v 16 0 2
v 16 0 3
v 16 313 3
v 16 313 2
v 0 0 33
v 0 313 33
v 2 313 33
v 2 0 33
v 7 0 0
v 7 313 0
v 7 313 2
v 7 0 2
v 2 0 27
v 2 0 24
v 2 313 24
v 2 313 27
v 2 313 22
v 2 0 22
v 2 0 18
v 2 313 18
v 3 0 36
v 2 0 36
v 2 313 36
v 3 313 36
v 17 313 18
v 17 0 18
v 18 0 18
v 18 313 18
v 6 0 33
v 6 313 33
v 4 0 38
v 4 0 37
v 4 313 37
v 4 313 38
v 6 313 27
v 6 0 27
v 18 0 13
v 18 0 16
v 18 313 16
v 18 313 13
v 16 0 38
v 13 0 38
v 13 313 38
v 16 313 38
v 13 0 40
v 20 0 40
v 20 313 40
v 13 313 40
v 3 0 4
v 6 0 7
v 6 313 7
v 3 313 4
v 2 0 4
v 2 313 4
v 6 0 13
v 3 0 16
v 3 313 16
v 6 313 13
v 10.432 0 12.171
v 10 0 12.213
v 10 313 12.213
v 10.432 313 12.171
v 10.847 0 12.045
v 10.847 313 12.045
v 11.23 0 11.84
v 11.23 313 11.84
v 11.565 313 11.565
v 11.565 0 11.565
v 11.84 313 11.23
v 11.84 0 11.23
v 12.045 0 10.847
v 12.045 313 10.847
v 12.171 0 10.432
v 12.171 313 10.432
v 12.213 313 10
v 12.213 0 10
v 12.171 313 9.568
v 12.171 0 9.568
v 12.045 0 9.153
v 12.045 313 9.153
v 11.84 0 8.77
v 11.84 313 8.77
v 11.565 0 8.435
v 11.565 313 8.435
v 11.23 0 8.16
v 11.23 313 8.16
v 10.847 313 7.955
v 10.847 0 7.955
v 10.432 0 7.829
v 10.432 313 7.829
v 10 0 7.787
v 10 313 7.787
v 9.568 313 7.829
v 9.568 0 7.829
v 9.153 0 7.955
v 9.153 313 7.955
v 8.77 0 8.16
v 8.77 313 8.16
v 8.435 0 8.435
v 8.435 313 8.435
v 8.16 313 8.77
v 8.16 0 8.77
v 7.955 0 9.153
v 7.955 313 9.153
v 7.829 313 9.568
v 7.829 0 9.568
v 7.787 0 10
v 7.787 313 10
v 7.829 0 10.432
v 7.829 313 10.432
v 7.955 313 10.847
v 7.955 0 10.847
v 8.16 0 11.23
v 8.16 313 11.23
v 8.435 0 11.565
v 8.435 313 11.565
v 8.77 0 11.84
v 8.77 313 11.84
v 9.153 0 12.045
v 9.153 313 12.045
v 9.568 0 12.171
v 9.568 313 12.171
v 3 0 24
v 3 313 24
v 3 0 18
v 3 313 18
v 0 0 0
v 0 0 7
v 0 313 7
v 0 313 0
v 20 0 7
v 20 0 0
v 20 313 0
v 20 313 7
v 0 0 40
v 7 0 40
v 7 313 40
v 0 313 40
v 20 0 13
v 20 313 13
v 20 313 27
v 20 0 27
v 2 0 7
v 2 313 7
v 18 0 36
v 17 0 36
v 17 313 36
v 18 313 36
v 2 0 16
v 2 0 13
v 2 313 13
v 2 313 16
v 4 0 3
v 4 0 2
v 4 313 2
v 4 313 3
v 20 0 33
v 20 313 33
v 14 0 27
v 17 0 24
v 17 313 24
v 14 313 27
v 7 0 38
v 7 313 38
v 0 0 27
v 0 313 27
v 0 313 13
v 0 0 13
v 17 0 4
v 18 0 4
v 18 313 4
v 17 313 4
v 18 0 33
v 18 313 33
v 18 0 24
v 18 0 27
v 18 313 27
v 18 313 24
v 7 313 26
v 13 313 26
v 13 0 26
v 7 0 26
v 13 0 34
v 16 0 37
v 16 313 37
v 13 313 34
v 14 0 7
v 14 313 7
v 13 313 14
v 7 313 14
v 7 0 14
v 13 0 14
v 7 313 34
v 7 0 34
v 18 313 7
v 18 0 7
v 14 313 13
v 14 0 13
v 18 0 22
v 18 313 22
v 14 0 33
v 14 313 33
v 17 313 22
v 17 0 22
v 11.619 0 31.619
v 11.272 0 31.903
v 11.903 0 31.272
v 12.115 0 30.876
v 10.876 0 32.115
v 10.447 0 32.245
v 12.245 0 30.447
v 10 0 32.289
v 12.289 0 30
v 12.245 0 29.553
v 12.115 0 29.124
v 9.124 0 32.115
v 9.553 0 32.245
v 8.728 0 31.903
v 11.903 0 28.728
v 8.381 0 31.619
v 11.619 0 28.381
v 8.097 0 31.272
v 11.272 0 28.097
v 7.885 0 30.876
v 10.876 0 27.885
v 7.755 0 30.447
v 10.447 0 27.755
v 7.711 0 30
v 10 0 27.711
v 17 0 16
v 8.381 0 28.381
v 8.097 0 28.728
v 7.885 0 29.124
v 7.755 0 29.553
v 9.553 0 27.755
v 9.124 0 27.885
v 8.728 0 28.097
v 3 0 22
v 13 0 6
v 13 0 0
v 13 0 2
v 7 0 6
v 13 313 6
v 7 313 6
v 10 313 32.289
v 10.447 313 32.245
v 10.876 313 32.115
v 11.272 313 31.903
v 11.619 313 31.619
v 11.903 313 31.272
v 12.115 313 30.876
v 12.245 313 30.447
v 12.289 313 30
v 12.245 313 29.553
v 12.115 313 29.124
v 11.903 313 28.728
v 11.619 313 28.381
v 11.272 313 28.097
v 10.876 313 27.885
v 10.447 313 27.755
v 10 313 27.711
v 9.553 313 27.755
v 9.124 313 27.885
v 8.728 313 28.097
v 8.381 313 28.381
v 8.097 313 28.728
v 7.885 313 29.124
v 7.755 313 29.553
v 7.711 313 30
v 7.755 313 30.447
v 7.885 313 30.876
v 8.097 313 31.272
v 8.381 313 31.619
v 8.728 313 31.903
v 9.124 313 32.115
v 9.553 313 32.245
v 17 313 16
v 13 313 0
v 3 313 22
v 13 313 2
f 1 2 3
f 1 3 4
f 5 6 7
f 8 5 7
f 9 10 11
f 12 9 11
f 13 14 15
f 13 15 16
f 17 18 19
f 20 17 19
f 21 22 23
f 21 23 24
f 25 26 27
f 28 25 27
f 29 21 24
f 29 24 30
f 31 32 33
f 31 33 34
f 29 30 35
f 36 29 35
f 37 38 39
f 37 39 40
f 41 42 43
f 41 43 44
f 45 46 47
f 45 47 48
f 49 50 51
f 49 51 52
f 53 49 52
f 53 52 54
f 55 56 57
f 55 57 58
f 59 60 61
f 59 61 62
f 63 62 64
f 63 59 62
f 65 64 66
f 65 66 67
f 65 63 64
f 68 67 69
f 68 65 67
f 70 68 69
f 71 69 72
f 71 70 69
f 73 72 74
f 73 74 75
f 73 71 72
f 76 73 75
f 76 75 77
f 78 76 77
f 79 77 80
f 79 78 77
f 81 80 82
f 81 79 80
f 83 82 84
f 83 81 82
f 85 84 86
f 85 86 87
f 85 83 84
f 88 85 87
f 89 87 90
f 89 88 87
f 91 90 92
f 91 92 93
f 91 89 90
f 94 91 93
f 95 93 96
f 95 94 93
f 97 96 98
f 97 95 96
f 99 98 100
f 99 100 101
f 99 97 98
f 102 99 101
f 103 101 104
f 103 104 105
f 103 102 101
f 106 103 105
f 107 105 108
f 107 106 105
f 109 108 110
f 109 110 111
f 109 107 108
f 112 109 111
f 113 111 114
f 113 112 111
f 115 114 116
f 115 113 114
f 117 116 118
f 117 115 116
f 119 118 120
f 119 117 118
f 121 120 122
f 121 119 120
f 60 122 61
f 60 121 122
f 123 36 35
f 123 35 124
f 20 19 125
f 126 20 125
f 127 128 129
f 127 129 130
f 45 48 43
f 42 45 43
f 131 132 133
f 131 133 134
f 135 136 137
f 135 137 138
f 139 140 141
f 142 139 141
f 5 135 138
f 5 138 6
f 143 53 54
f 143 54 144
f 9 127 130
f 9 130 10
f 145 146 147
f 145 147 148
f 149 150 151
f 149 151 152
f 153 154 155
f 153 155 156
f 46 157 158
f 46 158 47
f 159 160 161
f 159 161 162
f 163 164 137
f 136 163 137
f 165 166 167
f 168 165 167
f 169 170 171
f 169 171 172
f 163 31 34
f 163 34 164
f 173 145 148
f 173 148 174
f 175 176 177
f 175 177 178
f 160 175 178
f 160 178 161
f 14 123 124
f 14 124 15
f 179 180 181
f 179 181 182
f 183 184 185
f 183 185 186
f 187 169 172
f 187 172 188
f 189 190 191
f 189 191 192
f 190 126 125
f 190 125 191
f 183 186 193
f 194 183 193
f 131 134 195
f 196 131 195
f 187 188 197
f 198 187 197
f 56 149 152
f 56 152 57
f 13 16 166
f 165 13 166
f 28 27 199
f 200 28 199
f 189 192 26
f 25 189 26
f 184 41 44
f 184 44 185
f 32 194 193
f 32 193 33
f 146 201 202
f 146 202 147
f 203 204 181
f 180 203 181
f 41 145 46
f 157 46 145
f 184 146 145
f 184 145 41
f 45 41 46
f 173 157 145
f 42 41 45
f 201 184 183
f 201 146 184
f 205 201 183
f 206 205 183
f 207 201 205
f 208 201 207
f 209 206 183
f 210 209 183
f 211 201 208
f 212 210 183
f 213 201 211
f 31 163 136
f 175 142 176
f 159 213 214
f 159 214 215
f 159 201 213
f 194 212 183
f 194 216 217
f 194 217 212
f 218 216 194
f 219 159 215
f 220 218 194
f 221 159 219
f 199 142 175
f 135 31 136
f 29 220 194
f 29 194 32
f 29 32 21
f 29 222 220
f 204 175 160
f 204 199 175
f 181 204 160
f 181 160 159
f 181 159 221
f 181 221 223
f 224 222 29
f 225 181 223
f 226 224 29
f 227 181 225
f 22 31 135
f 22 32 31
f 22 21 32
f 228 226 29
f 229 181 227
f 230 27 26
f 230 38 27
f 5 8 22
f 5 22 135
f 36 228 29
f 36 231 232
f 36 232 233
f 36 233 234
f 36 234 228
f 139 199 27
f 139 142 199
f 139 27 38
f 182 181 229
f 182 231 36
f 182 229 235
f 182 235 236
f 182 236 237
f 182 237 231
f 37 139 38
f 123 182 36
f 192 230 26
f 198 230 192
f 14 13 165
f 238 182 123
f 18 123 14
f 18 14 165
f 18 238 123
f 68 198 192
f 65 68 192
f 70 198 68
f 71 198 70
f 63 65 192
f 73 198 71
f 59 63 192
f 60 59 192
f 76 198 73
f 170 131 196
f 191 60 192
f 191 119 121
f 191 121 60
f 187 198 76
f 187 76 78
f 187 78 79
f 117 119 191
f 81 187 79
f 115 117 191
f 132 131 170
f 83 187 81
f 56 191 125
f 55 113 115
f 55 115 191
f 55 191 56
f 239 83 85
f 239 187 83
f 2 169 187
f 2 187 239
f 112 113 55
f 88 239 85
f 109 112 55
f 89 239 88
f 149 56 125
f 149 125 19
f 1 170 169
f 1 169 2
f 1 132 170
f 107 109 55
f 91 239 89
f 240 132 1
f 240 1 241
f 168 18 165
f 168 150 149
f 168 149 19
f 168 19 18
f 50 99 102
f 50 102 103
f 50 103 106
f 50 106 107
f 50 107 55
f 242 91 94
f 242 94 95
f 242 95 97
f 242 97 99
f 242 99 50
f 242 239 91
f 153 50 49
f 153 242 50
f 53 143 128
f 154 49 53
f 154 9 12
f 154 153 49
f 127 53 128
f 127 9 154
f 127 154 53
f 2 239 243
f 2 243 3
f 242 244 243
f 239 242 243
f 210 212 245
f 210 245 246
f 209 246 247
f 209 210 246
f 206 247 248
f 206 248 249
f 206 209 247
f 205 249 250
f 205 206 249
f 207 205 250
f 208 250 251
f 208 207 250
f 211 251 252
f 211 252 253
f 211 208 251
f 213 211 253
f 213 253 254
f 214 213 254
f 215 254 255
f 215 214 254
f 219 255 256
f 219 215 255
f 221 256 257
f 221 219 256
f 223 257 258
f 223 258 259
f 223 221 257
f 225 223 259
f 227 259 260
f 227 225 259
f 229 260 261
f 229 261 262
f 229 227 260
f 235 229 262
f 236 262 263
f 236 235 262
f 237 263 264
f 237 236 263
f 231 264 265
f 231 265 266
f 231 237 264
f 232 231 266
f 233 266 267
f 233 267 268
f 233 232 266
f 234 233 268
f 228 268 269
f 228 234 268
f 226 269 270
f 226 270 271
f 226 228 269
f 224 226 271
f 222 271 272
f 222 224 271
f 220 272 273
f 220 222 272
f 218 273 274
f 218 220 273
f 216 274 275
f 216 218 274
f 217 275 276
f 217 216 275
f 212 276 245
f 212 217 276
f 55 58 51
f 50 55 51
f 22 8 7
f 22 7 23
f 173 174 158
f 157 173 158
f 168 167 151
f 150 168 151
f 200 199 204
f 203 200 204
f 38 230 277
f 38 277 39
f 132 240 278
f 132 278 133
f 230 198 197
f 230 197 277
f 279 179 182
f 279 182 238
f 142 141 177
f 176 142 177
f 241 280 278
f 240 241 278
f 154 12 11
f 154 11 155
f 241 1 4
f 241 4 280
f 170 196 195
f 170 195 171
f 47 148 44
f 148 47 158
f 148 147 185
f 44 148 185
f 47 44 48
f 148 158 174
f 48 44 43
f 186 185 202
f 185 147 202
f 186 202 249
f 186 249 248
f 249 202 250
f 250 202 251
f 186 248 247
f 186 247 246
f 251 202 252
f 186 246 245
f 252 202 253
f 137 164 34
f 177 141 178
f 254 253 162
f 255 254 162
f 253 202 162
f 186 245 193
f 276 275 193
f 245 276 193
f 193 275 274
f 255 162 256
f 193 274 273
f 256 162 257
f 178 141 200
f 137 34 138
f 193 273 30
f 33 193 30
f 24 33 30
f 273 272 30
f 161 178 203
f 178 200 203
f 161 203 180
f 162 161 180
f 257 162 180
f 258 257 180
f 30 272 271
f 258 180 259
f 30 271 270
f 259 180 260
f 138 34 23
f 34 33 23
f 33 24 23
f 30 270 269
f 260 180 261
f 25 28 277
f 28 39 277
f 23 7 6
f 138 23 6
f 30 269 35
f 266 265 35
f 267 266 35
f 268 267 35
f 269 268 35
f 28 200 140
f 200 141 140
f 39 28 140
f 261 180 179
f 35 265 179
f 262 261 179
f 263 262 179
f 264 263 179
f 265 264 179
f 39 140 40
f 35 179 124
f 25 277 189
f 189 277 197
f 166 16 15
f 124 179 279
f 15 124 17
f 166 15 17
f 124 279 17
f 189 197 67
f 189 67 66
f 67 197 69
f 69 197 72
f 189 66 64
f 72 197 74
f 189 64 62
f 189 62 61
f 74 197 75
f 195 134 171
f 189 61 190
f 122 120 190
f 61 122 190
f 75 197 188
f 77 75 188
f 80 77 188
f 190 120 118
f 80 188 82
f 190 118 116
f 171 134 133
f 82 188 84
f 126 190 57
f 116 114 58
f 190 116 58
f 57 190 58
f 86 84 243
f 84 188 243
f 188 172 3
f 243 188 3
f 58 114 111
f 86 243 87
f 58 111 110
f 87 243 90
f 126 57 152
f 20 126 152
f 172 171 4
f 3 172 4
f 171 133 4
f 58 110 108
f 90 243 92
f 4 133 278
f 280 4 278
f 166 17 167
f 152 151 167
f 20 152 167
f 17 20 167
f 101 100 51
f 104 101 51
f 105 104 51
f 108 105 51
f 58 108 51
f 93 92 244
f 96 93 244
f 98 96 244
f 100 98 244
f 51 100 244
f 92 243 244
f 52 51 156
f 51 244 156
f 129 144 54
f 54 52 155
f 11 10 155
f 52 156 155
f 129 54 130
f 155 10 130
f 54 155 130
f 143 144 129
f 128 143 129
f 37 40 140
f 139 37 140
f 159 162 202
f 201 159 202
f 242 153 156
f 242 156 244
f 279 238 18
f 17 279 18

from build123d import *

# Parameters (mm, degrees)
SKETCH1_R           = 2.213186583
SKETCH1_R_2         = 2.28890728
BOSS_EXTRUDE1_DEPTH = 313


with BuildPart() as part:
    # Sketch1 → Boss-Extrude1 (new body)
    with BuildSketch(Plane(origin=(0, 0, 0), x_dir=(1, 0, 0), z_dir=(0, 1, 0))):
        Polygon((20, 0), (20, -7), (18, -7), (18, -4), (17, -4), (14, -7), (14, -13), (17, -16), (18, -16), (18, -13), (20, -13), (20, -27), (18, -27), (18, -24), (17, -24), (14, -27), (14, -33), (17, -36), (18, -36), (18, -33), (20, -33), (20, -40), (13, -40), (13, -38), (16, -38), (16, -37), (13, -34), (7, -34), (4, -37), (4, -38), (7, -38), (7, -40), (0, -40), (0, -33), (2, -33), (2, -36), (3, -36), (6, -33), (6, -27), (3, -24), (2, -24), (2, -27), (0, -27), (0, -13), (2, -13), (2, -16), (3, -16), (6, -13), (6, -7), (3, -4), (2, -4), (2, -7), (0, -7), (0, 0), (7, 0), (7, -2), (4, -2), (4, -3), (7, -6), (13, -6), (16, -3), (16, -2), (13, -2), (13, 0), align=None)
        with Locations(Location((10, -10, 0), (0, 0, 270))):
            Circle(SKETCH1_R, mode=Mode.SUBTRACT)
        with Locations(Location((10, -30, 0), (0, 0, 270))):
            Circle(SKETCH1_R_2, mode=Mode.SUBTRACT)
        Polygon((7, -14), (13, -14), (17, -18), (18, -18), (18, -22), (17, -22), (13, -26), (7, -26), (3, -22), (2, -22), (2, -18), (3, -18), align=None, mode=Mode.SUBTRACT)
    extrude(amount=BOSS_EXTRUDE1_DEPTH)


solid = part.part
